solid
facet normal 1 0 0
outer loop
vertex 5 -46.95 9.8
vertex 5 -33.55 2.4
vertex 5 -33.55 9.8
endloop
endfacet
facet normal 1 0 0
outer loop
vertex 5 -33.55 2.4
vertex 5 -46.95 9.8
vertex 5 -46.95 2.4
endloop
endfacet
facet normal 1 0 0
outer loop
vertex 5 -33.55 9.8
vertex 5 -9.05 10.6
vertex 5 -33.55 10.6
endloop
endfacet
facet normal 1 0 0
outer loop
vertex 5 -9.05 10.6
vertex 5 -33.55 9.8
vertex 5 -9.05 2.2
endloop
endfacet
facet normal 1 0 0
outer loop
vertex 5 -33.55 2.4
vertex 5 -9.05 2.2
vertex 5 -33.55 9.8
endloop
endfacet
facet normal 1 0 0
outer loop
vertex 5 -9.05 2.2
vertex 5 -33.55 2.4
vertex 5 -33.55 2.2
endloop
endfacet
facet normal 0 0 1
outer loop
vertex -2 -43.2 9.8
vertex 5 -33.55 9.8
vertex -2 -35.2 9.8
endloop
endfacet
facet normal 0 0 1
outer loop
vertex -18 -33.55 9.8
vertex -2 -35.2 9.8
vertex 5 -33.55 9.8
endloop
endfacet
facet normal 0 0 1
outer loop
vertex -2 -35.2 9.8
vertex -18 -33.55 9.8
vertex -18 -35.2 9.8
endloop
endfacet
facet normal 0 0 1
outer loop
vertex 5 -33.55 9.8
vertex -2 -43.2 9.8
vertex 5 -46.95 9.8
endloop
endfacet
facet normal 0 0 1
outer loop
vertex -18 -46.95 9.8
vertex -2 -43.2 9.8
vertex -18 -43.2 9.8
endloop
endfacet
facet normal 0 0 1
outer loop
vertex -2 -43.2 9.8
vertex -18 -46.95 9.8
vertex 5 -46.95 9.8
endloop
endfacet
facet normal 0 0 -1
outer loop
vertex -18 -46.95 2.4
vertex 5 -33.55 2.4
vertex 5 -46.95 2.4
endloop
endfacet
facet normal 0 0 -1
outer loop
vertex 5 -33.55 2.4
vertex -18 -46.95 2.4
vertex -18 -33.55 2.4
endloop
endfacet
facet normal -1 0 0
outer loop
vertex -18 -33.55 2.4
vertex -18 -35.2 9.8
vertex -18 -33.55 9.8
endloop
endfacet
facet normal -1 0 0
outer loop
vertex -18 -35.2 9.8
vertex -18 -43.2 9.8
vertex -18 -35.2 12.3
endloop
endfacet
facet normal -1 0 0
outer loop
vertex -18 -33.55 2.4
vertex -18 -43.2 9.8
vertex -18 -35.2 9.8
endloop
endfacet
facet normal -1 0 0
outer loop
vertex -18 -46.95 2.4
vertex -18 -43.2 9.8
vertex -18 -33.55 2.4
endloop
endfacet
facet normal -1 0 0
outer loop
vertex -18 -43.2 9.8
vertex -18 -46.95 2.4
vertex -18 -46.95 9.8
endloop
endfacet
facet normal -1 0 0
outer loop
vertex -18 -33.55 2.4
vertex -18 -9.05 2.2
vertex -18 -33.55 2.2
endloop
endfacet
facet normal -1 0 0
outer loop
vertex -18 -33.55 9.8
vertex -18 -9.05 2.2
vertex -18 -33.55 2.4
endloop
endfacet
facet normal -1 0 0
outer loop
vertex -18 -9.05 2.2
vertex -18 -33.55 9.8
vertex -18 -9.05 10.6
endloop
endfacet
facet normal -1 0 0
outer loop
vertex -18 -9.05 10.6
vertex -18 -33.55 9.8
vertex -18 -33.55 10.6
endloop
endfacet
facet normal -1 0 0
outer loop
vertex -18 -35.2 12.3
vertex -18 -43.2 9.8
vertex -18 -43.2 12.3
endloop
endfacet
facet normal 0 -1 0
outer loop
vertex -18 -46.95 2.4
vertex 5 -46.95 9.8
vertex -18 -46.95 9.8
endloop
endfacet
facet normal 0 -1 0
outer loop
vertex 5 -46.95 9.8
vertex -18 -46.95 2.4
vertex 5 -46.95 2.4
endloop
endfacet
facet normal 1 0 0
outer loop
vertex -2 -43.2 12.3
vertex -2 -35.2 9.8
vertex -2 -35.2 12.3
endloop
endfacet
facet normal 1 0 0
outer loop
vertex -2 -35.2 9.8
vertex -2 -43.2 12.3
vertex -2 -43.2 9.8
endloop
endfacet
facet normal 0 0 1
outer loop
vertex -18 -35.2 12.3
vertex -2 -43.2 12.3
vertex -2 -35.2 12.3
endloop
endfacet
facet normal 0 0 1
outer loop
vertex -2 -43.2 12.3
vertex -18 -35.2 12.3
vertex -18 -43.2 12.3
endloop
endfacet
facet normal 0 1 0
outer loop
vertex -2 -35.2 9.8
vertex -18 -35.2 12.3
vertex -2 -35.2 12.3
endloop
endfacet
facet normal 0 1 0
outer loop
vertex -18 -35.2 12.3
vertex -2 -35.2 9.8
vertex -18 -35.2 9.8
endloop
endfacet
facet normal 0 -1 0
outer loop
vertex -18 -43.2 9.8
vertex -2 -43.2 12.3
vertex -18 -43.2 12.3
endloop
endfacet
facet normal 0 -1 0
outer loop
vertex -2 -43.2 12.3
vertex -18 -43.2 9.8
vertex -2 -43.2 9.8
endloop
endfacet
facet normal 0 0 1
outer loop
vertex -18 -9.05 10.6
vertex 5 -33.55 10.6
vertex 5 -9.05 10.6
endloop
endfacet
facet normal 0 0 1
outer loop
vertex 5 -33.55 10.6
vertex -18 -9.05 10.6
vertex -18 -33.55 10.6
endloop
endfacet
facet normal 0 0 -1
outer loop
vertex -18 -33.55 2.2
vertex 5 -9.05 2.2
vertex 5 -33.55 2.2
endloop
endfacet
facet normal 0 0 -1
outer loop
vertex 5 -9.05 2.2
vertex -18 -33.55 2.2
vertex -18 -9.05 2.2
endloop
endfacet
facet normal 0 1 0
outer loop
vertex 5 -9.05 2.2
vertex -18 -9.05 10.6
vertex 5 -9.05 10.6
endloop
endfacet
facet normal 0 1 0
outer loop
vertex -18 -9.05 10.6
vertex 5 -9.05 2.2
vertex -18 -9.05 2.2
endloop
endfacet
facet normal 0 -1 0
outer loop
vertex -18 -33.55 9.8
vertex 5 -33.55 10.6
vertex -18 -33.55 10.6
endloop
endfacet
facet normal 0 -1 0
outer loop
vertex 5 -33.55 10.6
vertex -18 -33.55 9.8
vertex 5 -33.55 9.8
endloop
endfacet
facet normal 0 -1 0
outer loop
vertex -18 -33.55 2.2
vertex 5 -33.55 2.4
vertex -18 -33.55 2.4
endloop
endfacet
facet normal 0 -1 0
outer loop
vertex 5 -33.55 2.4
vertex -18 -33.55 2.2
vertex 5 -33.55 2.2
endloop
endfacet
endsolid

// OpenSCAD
// Mated SATA cable plugs (nominal housings), positioned on the reference
// drive's device connector. Not a printed part and not part of the drive:
// it exists so the rear panel's cutout can be checked against what has to
// pass through it. Data plug carries its latch bump.
include <params.scad>

plug_data_w = 15.5; plug_data_h = 7.4;  plug_data_latch_h = 2.5;
plug_pwr_w  = 24.5; plug_pwr_h  = 8.4;
plug_len    = 18;                        // housing length behind the connector face

module sata_plugs() {
    // data plug: centred on the signal segment, latch on top
    yc = sata_y0 + sata_sig_l/2;
    color("DarkRed") {
        translate([-plug_len, yc - plug_data_w/2, sata_z0 - 2.2]) cube([plug_len + sata_tongue_depth - 1, plug_data_w, plug_data_h]);
        translate([-plug_len, yc - 4, sata_z0 - 2.2 + plug_data_h]) cube([plug_len - 2, 8, plug_data_latch_h]);
    }
    // power plug: centred on the power segment
    yp = sata_y0 + sata_sig_l + sata_key_l + sata_pwr_l/2;
    color("Black") translate([-plug_len, yp - plug_pwr_w/2, sata_z0 - 2.4]) cube([plug_len + sata_tongue_depth - 1, plug_pwr_w, plug_pwr_h]);
}

sata_plugs();
